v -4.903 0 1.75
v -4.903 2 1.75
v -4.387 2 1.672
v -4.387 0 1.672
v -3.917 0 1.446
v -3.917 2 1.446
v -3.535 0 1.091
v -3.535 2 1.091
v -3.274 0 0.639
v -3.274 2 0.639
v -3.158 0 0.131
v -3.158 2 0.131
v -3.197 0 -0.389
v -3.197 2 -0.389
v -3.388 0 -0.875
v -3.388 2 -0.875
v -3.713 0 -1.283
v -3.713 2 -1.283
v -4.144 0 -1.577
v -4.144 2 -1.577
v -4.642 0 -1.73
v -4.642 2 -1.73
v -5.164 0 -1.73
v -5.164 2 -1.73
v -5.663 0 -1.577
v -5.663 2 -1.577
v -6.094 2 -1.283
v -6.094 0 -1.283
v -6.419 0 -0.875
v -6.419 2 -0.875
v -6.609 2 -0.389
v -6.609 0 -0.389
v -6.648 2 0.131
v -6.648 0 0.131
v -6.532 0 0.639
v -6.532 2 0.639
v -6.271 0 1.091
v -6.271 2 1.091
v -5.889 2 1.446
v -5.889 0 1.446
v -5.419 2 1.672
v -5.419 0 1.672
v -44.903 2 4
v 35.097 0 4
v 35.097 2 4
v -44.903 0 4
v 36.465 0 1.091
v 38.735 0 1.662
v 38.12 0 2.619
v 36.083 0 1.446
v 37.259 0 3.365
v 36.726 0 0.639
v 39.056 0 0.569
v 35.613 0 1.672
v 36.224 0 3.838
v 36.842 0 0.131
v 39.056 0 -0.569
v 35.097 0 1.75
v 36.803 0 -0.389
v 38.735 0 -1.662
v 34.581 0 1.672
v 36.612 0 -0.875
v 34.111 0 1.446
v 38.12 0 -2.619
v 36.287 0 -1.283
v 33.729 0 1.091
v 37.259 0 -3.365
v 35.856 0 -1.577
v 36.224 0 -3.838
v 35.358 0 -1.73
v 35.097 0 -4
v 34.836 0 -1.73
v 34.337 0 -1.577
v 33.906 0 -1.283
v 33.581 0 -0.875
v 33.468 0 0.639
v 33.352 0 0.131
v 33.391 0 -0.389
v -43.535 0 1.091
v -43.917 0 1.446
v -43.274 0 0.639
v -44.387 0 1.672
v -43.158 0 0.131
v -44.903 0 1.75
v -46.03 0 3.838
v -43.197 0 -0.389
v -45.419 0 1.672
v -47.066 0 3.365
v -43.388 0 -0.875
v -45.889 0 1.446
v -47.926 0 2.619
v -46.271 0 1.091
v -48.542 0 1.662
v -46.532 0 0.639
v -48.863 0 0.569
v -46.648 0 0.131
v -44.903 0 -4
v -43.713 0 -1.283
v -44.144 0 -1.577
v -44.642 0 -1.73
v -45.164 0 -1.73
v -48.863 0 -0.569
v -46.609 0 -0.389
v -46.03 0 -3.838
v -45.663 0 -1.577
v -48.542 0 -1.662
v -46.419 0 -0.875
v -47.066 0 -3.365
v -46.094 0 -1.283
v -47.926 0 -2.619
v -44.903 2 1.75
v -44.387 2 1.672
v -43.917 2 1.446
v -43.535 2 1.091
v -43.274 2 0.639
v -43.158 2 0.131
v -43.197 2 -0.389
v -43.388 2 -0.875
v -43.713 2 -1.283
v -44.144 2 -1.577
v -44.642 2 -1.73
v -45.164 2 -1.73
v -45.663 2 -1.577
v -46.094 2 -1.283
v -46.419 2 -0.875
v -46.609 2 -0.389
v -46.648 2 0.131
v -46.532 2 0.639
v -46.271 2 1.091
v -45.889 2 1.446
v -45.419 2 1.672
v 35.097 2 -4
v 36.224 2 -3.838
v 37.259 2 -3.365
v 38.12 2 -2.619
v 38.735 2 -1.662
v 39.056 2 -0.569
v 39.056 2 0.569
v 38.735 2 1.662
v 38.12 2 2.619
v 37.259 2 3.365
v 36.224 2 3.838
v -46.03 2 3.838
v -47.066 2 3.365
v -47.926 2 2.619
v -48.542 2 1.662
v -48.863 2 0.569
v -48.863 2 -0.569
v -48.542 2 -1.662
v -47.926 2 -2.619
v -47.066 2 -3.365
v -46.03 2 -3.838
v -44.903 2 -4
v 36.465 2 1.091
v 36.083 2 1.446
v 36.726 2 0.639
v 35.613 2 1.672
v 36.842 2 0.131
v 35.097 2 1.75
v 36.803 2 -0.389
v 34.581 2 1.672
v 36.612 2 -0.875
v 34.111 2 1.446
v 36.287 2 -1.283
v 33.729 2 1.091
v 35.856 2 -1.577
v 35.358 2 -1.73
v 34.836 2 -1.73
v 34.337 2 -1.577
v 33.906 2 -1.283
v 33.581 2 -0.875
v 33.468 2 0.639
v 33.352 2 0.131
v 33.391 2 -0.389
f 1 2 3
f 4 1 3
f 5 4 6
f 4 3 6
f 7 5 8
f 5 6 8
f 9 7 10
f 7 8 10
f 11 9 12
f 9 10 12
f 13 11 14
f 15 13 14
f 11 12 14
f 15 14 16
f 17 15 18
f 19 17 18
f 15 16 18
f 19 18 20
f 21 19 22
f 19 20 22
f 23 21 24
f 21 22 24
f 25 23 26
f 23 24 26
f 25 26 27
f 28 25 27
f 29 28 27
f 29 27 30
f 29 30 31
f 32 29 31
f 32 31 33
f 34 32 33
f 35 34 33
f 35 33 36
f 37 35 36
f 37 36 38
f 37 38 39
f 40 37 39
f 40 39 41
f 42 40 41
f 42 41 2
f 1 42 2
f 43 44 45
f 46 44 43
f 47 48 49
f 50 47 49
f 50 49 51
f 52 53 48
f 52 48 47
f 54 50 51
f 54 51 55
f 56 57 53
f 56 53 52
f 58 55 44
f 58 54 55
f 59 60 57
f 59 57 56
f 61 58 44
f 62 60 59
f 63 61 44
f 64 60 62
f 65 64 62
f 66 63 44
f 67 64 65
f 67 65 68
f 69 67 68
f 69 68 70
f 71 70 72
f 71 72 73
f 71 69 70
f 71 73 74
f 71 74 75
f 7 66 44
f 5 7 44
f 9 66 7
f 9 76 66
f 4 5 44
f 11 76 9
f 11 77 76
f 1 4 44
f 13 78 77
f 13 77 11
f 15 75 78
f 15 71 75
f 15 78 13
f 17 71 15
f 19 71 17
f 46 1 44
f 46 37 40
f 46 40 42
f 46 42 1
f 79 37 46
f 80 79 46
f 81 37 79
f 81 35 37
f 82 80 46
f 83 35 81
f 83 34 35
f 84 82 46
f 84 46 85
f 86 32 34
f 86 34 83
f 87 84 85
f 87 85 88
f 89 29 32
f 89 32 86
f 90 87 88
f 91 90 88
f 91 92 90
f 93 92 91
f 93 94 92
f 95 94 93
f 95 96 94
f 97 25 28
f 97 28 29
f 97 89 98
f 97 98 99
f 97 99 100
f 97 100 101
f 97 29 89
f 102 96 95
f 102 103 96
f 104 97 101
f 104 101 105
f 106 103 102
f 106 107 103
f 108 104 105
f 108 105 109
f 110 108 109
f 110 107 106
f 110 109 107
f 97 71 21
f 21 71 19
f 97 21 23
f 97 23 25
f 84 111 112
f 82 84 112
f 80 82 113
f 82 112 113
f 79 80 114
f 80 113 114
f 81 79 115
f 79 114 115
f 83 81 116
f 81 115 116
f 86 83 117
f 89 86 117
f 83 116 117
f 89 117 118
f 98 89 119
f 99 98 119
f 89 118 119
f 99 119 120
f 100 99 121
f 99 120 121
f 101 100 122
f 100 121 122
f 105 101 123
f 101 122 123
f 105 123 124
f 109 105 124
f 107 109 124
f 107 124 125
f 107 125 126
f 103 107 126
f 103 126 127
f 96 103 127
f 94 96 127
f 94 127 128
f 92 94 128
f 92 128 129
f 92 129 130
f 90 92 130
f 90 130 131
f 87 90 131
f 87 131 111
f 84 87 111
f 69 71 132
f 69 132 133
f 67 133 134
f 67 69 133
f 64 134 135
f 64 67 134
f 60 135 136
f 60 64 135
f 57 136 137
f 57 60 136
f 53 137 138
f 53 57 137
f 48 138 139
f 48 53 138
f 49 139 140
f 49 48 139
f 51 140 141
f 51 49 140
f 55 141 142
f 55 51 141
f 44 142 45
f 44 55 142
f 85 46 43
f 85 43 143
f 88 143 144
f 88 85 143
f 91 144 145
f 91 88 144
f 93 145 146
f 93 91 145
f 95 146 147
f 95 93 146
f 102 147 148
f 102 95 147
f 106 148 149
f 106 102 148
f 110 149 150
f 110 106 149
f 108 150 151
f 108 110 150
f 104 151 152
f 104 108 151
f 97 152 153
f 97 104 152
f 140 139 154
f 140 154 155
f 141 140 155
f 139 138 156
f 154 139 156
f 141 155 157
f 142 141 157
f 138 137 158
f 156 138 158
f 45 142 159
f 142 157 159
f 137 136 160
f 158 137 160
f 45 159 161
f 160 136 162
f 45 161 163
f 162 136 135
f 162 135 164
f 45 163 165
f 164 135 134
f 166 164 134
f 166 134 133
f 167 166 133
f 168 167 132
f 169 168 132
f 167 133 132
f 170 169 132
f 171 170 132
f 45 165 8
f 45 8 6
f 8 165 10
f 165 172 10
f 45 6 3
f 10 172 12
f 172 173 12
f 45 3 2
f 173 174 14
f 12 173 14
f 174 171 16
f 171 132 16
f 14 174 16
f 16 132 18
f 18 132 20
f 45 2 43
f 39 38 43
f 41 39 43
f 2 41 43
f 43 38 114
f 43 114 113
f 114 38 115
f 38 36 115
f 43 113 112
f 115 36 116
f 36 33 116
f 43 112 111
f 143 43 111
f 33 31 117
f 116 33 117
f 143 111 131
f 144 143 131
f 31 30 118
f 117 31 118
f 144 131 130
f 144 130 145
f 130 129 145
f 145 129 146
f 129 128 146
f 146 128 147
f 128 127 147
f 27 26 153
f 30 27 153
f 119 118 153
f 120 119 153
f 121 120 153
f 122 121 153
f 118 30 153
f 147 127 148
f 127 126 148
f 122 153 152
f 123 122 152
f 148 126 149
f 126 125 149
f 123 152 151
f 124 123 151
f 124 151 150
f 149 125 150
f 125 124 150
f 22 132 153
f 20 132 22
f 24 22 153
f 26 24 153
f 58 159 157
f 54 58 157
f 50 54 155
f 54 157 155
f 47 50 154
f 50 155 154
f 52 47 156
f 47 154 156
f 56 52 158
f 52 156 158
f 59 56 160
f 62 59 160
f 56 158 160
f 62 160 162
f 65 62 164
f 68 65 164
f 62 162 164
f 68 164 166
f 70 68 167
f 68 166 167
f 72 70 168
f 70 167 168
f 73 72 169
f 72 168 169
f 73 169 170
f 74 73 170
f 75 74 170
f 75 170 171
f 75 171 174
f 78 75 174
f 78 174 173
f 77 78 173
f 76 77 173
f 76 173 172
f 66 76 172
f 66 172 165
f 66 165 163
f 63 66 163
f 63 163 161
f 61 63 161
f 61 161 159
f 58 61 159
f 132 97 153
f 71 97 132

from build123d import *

# Parameters (mm, degrees)
EXTRUDE_1_DEPTH     = 2
SKETCH_2_R          = 1.75
CUT_EXTRUDE_1_DEPTH = 50.107311212


with BuildPart() as part:
    # 草图1 → 凸台-拉伸1 (new body)
    with BuildSketch(Plane(origin=(0, 0, 0), x_dir=(1, 0, 0), z_dir=(0, 1, 0))):
        with BuildLine():
            Line((-44.903251574, 4), (35.096748426, 4))
            ThreePointArc((35.096748426, 4), (39.096748426, 0), (35.096748426, -4))
            Line((35.096748426, -4), (-44.903251574, -4))
            ThreePointArc((-44.903251574, -4), (-48.903251574, 0), (-44.903251574, 4))
        make_face()
    extrude(amount=EXTRUDE_1_DEPTH)

    # 草图2 → 切除-拉伸1 (cut, through all)
    with BuildSketch(Plane(origin=(0, 2, 0), x_dir=(1, 0, 0), z_dir=(0, 1, 0))):
        with Locations(Location((-44.903251574, 0, 0), (0, 0, 270))):
            Circle(SKETCH_2_R)
        with Locations(Location((35.096748426, 0, 0), (0, 0, 270))):
            Circle(SKETCH_2_R)
        with Locations(Location((-4.903251574, 0, 0), (0, 0, 270))):
            Circle(SKETCH_2_R)
    extrude(amount=-CUT_EXTRUDE_1_DEPTH, mode=Mode.SUBTRACT)


solid = part.part
